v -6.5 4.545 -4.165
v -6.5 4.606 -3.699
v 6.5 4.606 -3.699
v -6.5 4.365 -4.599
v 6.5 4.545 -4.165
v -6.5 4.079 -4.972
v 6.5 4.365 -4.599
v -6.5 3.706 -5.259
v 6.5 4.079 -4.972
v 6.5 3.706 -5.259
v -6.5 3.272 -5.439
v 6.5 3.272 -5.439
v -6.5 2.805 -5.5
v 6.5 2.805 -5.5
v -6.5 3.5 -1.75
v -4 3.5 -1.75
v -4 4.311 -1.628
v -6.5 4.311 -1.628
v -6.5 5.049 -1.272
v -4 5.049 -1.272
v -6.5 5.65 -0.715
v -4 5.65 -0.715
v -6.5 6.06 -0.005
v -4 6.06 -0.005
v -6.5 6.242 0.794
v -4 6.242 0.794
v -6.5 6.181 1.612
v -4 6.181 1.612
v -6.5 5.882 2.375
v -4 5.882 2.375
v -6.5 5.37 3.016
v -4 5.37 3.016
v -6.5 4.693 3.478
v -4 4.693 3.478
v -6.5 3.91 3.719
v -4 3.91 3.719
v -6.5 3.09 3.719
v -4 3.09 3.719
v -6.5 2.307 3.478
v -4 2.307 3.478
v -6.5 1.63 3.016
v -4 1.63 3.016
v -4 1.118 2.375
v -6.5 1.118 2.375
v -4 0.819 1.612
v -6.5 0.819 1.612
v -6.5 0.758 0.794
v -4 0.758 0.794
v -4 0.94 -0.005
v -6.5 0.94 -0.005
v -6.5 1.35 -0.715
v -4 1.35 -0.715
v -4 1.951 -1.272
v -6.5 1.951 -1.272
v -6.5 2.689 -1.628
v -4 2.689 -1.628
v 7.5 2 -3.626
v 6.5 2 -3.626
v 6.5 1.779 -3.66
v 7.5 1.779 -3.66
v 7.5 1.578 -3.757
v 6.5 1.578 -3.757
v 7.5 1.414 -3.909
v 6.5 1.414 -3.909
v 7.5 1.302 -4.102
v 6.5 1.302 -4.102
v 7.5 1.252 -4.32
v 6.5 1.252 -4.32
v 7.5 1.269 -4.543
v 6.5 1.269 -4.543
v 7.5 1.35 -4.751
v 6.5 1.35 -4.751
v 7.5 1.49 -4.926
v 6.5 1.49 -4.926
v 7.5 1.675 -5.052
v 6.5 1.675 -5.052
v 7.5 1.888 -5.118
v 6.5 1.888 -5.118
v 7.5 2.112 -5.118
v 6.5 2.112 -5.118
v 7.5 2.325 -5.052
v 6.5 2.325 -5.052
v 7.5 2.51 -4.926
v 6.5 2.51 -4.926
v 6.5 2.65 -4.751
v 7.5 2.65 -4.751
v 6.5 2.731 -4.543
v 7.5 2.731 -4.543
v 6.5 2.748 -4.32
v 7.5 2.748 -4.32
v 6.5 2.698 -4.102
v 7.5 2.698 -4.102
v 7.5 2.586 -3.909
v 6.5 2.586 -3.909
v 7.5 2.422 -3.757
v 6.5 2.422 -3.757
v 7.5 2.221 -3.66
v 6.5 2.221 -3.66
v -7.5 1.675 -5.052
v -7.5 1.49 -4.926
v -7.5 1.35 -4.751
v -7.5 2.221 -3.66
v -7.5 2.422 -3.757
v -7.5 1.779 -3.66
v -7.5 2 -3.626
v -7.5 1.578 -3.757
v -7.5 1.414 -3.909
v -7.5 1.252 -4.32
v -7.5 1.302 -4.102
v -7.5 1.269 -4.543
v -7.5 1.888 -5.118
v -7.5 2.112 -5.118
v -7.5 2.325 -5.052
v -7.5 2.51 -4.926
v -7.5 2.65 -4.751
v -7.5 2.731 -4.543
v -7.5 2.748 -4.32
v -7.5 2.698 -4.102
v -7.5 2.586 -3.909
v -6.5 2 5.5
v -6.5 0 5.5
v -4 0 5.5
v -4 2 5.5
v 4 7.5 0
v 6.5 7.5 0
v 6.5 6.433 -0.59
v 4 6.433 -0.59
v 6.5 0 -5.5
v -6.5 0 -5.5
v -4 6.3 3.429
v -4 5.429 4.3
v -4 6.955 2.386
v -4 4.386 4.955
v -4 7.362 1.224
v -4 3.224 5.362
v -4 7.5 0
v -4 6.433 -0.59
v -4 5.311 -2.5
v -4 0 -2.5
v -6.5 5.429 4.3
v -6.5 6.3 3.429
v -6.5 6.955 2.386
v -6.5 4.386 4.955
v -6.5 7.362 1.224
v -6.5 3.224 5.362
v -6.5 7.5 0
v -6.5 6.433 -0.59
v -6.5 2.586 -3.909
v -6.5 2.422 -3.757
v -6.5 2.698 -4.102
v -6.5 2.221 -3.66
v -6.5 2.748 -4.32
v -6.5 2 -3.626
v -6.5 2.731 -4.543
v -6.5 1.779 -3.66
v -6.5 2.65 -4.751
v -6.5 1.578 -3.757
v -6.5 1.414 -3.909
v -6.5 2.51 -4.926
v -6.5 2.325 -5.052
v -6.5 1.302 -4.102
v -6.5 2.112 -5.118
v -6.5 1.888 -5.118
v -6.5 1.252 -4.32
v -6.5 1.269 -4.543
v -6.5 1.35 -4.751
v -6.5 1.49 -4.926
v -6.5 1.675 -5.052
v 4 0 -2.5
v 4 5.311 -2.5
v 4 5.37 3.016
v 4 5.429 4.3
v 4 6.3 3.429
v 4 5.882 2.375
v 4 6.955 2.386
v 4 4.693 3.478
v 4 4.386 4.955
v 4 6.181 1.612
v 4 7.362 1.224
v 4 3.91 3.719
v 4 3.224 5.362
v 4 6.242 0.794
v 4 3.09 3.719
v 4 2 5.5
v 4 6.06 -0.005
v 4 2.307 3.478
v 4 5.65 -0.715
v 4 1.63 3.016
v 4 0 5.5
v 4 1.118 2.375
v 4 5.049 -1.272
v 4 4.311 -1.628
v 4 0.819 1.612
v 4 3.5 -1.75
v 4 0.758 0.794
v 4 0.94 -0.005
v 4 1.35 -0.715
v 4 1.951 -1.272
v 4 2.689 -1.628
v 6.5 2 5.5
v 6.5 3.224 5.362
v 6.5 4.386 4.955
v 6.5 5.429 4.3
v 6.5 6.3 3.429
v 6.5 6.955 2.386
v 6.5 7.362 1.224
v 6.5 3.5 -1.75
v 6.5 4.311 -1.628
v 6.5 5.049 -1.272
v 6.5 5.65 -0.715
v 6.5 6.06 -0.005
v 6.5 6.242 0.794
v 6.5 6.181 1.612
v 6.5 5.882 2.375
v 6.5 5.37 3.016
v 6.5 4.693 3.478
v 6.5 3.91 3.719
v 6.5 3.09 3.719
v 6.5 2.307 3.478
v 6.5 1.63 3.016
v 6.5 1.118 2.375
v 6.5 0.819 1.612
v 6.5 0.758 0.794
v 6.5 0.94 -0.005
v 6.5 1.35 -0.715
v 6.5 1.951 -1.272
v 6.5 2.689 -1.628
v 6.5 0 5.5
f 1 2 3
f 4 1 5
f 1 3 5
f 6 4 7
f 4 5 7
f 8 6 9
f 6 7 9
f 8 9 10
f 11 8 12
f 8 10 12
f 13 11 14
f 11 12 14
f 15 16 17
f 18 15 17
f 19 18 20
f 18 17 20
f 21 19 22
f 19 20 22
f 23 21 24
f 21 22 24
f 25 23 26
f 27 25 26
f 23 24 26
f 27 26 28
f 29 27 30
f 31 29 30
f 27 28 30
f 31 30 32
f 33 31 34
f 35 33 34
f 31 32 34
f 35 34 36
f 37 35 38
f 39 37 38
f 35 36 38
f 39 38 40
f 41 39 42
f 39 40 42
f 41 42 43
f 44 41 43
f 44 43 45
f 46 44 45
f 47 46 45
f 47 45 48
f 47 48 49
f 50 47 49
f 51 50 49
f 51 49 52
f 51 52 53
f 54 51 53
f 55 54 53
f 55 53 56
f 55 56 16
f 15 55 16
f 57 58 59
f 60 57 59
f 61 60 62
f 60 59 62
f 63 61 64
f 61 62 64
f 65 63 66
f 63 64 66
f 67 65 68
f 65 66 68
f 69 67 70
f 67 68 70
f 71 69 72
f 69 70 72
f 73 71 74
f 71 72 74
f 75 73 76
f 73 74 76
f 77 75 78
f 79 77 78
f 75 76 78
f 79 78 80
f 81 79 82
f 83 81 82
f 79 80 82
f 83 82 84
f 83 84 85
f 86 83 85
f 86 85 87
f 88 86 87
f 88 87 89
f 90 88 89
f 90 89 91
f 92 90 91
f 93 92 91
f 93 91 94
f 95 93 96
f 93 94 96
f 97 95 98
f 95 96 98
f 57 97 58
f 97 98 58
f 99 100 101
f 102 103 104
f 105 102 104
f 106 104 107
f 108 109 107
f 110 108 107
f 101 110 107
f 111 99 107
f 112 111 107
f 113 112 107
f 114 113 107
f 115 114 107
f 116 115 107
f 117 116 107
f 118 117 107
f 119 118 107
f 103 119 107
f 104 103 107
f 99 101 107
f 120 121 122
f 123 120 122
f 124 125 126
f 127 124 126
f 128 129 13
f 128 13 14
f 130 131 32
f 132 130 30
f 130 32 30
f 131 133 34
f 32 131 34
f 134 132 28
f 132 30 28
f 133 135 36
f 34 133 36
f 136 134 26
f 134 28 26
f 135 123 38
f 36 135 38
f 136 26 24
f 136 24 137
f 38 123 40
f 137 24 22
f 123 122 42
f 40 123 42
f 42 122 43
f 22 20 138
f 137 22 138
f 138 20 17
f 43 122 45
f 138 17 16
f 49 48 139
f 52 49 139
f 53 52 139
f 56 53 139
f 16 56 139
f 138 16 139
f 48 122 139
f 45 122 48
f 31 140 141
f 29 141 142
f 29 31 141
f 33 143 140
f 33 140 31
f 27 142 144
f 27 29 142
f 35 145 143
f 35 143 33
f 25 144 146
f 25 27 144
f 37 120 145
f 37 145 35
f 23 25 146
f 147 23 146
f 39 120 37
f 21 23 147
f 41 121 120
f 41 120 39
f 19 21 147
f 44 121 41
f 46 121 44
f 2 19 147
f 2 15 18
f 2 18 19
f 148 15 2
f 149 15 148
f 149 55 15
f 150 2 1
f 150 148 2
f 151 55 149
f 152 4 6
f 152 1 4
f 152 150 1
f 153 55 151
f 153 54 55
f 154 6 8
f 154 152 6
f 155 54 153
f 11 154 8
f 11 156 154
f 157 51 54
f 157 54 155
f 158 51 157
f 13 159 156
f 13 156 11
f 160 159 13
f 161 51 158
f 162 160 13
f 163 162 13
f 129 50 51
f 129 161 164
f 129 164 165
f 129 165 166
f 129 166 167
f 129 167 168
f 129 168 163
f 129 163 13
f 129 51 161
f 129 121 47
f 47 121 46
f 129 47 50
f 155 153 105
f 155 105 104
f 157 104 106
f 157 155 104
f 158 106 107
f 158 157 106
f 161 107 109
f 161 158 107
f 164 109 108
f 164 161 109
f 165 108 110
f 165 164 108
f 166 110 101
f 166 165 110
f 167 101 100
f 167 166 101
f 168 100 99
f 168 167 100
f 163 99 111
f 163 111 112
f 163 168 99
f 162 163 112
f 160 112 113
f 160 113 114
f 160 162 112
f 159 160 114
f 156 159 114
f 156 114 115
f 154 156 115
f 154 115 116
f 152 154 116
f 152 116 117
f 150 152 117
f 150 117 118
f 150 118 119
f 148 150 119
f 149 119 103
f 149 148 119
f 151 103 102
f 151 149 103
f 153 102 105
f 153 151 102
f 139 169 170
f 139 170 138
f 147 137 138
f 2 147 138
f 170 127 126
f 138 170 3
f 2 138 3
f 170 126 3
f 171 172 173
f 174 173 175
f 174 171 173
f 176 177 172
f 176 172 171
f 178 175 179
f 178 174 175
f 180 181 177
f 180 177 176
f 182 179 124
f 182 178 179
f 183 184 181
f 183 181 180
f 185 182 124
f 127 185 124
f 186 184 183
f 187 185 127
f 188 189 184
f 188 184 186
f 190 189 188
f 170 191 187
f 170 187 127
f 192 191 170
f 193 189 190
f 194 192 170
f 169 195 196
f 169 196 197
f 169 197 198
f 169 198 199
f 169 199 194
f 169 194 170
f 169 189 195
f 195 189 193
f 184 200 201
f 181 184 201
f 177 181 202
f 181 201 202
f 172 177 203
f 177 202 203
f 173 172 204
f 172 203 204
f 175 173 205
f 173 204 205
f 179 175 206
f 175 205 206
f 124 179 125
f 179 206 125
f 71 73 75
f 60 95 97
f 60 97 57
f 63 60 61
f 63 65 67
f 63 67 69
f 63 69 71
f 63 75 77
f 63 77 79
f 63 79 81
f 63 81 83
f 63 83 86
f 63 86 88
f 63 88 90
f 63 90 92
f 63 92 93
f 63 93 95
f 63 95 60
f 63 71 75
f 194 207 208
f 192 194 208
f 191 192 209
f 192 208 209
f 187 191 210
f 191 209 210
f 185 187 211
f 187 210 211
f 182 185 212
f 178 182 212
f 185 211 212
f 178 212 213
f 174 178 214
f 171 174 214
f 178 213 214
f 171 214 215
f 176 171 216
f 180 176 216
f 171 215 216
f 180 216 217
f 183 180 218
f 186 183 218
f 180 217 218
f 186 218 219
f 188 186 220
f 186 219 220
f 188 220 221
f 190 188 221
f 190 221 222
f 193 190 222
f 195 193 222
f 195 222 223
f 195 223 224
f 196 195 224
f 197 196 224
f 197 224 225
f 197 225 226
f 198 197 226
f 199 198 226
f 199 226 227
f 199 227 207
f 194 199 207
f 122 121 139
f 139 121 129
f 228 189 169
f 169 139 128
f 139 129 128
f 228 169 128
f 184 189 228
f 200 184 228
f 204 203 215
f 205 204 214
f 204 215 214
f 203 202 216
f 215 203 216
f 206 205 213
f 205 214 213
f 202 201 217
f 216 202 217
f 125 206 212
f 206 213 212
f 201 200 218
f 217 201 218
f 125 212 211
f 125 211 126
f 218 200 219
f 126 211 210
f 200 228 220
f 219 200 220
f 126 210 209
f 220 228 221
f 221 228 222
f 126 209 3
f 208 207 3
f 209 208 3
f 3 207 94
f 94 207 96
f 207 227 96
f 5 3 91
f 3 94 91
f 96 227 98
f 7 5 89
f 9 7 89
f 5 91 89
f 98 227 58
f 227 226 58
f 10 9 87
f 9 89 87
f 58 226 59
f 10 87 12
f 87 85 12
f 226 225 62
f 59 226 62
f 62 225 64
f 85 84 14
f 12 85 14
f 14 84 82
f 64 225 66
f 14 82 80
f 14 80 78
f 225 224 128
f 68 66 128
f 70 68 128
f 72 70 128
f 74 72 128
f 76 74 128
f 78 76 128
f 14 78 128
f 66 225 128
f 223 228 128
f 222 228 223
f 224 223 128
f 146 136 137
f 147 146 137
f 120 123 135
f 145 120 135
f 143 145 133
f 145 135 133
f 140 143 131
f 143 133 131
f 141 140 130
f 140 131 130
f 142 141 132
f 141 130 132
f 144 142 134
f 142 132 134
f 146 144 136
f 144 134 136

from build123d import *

# Parameters (mm, degrees)
SKETCH_3_W          = 13
SKETCH_3_H          = 11
EXTRUDE_1_DEPTH     = 10
SKETCH_5_R          = 2.75
CUT_EXTRUDE_3_DEPTH = 18.298843892
SKETCH_5_6_R        = 0.75
EXTRUDE_2_DEPTH     = 1
SKETCH_10_W         = 7
SKETCH_10_H         = 8
CUT_EXTRUDE_5_DEPTH = 12.947803145
SKETCH_11_W         = 0.5
SKETCH_11_H         = 8
CUT_EXTRUDE_6_DEPTH = 12.947803145


with BuildPart() as part:
    # 草图3 → 凸台-拉伸1 (new body)
    with BuildSketch(Plane(origin=(0, 0, 0), x_dir=(1, 0, 0), z_dir=(0, 1, 0))):
        Rectangle(SKETCH_3_W, SKETCH_3_H)
    extrude(amount=EXTRUDE_1_DEPTH)

    # 草图5 → 切除-拉伸3 (cut, through all)
    with BuildSketch(Plane(origin=(6.5, 0, 0), x_dir=(0, 0, -1), z_dir=(1, 0, 0))):
        with BuildLine():
            Line((-5.5, 10), (-5.5, 2))
            ThreePointArc((-5.5, 2), (-3.889087297, 5.889087297), (0, 7.5))
            Line((0, 7.5), (0.590375146, 6.432854109))
            Line((0.590375146, 6.432854109), (3.698964751, 4.606439417))
            ThreePointArc((3.698964751, 4.606439417), (4.972488989, 4.078928406), (5.5, 2.805404168))
            Line((5.5, 2.805404168), (5.5, 10))
            Line((5.5, 10), (-5.5, 10))
        make_face()
        with Locations((-1, 3.5)):
            Circle(SKETCH_5_R)
    extrude(amount=-CUT_EXTRUDE_3_DEPTH, mode=Mode.SUBTRACT)

    # 草图5<6> → 凸台-拉伸2 (add)
    with BuildSketch(Plane(origin=(6.5, 0, 0), x_dir=(0, 0, -1), z_dir=(1, 0, 0))):
        with Locations((4.376425526, 2)):
            Circle(SKETCH_5_6_R)
    extrude_2 = extrude(amount=EXTRUDE_2_DEPTH)

    # 草图10 → 切除-拉伸5 (cut, through all)
    with BuildSketch(Plane.XZ):
        with Locations((0, 1.5)):
            Rectangle(SKETCH_10_W, SKETCH_10_H)
    extrude(amount=-CUT_EXTRUDE_5_DEPTH, mode=Mode.SUBTRACT)

    # 镜向1: 凸台-拉伸2 across plane
    add(extrude_2.mirror(Plane(origin=(0, 0, 0), x_dir=(0, 0, 1), z_dir=(1, 0, 0))))

    # 草图11 → 切除-拉伸6 (cut, through all)
    with BuildSketch(Plane(origin=(0, 0, 0), x_dir=(-1, 0, 0), z_dir=(0, -1, 0))):
        with Locations((-3.75, -1.5)):
            Rectangle(SKETCH_11_W, SKETCH_11_H)
        with Locations((3.75, -1.5)):
            Rectangle(SKETCH_11_W, SKETCH_11_H)
    extrude(amount=-CUT_EXTRUDE_6_DEPTH, mode=Mode.SUBTRACT)


solid = part.part
